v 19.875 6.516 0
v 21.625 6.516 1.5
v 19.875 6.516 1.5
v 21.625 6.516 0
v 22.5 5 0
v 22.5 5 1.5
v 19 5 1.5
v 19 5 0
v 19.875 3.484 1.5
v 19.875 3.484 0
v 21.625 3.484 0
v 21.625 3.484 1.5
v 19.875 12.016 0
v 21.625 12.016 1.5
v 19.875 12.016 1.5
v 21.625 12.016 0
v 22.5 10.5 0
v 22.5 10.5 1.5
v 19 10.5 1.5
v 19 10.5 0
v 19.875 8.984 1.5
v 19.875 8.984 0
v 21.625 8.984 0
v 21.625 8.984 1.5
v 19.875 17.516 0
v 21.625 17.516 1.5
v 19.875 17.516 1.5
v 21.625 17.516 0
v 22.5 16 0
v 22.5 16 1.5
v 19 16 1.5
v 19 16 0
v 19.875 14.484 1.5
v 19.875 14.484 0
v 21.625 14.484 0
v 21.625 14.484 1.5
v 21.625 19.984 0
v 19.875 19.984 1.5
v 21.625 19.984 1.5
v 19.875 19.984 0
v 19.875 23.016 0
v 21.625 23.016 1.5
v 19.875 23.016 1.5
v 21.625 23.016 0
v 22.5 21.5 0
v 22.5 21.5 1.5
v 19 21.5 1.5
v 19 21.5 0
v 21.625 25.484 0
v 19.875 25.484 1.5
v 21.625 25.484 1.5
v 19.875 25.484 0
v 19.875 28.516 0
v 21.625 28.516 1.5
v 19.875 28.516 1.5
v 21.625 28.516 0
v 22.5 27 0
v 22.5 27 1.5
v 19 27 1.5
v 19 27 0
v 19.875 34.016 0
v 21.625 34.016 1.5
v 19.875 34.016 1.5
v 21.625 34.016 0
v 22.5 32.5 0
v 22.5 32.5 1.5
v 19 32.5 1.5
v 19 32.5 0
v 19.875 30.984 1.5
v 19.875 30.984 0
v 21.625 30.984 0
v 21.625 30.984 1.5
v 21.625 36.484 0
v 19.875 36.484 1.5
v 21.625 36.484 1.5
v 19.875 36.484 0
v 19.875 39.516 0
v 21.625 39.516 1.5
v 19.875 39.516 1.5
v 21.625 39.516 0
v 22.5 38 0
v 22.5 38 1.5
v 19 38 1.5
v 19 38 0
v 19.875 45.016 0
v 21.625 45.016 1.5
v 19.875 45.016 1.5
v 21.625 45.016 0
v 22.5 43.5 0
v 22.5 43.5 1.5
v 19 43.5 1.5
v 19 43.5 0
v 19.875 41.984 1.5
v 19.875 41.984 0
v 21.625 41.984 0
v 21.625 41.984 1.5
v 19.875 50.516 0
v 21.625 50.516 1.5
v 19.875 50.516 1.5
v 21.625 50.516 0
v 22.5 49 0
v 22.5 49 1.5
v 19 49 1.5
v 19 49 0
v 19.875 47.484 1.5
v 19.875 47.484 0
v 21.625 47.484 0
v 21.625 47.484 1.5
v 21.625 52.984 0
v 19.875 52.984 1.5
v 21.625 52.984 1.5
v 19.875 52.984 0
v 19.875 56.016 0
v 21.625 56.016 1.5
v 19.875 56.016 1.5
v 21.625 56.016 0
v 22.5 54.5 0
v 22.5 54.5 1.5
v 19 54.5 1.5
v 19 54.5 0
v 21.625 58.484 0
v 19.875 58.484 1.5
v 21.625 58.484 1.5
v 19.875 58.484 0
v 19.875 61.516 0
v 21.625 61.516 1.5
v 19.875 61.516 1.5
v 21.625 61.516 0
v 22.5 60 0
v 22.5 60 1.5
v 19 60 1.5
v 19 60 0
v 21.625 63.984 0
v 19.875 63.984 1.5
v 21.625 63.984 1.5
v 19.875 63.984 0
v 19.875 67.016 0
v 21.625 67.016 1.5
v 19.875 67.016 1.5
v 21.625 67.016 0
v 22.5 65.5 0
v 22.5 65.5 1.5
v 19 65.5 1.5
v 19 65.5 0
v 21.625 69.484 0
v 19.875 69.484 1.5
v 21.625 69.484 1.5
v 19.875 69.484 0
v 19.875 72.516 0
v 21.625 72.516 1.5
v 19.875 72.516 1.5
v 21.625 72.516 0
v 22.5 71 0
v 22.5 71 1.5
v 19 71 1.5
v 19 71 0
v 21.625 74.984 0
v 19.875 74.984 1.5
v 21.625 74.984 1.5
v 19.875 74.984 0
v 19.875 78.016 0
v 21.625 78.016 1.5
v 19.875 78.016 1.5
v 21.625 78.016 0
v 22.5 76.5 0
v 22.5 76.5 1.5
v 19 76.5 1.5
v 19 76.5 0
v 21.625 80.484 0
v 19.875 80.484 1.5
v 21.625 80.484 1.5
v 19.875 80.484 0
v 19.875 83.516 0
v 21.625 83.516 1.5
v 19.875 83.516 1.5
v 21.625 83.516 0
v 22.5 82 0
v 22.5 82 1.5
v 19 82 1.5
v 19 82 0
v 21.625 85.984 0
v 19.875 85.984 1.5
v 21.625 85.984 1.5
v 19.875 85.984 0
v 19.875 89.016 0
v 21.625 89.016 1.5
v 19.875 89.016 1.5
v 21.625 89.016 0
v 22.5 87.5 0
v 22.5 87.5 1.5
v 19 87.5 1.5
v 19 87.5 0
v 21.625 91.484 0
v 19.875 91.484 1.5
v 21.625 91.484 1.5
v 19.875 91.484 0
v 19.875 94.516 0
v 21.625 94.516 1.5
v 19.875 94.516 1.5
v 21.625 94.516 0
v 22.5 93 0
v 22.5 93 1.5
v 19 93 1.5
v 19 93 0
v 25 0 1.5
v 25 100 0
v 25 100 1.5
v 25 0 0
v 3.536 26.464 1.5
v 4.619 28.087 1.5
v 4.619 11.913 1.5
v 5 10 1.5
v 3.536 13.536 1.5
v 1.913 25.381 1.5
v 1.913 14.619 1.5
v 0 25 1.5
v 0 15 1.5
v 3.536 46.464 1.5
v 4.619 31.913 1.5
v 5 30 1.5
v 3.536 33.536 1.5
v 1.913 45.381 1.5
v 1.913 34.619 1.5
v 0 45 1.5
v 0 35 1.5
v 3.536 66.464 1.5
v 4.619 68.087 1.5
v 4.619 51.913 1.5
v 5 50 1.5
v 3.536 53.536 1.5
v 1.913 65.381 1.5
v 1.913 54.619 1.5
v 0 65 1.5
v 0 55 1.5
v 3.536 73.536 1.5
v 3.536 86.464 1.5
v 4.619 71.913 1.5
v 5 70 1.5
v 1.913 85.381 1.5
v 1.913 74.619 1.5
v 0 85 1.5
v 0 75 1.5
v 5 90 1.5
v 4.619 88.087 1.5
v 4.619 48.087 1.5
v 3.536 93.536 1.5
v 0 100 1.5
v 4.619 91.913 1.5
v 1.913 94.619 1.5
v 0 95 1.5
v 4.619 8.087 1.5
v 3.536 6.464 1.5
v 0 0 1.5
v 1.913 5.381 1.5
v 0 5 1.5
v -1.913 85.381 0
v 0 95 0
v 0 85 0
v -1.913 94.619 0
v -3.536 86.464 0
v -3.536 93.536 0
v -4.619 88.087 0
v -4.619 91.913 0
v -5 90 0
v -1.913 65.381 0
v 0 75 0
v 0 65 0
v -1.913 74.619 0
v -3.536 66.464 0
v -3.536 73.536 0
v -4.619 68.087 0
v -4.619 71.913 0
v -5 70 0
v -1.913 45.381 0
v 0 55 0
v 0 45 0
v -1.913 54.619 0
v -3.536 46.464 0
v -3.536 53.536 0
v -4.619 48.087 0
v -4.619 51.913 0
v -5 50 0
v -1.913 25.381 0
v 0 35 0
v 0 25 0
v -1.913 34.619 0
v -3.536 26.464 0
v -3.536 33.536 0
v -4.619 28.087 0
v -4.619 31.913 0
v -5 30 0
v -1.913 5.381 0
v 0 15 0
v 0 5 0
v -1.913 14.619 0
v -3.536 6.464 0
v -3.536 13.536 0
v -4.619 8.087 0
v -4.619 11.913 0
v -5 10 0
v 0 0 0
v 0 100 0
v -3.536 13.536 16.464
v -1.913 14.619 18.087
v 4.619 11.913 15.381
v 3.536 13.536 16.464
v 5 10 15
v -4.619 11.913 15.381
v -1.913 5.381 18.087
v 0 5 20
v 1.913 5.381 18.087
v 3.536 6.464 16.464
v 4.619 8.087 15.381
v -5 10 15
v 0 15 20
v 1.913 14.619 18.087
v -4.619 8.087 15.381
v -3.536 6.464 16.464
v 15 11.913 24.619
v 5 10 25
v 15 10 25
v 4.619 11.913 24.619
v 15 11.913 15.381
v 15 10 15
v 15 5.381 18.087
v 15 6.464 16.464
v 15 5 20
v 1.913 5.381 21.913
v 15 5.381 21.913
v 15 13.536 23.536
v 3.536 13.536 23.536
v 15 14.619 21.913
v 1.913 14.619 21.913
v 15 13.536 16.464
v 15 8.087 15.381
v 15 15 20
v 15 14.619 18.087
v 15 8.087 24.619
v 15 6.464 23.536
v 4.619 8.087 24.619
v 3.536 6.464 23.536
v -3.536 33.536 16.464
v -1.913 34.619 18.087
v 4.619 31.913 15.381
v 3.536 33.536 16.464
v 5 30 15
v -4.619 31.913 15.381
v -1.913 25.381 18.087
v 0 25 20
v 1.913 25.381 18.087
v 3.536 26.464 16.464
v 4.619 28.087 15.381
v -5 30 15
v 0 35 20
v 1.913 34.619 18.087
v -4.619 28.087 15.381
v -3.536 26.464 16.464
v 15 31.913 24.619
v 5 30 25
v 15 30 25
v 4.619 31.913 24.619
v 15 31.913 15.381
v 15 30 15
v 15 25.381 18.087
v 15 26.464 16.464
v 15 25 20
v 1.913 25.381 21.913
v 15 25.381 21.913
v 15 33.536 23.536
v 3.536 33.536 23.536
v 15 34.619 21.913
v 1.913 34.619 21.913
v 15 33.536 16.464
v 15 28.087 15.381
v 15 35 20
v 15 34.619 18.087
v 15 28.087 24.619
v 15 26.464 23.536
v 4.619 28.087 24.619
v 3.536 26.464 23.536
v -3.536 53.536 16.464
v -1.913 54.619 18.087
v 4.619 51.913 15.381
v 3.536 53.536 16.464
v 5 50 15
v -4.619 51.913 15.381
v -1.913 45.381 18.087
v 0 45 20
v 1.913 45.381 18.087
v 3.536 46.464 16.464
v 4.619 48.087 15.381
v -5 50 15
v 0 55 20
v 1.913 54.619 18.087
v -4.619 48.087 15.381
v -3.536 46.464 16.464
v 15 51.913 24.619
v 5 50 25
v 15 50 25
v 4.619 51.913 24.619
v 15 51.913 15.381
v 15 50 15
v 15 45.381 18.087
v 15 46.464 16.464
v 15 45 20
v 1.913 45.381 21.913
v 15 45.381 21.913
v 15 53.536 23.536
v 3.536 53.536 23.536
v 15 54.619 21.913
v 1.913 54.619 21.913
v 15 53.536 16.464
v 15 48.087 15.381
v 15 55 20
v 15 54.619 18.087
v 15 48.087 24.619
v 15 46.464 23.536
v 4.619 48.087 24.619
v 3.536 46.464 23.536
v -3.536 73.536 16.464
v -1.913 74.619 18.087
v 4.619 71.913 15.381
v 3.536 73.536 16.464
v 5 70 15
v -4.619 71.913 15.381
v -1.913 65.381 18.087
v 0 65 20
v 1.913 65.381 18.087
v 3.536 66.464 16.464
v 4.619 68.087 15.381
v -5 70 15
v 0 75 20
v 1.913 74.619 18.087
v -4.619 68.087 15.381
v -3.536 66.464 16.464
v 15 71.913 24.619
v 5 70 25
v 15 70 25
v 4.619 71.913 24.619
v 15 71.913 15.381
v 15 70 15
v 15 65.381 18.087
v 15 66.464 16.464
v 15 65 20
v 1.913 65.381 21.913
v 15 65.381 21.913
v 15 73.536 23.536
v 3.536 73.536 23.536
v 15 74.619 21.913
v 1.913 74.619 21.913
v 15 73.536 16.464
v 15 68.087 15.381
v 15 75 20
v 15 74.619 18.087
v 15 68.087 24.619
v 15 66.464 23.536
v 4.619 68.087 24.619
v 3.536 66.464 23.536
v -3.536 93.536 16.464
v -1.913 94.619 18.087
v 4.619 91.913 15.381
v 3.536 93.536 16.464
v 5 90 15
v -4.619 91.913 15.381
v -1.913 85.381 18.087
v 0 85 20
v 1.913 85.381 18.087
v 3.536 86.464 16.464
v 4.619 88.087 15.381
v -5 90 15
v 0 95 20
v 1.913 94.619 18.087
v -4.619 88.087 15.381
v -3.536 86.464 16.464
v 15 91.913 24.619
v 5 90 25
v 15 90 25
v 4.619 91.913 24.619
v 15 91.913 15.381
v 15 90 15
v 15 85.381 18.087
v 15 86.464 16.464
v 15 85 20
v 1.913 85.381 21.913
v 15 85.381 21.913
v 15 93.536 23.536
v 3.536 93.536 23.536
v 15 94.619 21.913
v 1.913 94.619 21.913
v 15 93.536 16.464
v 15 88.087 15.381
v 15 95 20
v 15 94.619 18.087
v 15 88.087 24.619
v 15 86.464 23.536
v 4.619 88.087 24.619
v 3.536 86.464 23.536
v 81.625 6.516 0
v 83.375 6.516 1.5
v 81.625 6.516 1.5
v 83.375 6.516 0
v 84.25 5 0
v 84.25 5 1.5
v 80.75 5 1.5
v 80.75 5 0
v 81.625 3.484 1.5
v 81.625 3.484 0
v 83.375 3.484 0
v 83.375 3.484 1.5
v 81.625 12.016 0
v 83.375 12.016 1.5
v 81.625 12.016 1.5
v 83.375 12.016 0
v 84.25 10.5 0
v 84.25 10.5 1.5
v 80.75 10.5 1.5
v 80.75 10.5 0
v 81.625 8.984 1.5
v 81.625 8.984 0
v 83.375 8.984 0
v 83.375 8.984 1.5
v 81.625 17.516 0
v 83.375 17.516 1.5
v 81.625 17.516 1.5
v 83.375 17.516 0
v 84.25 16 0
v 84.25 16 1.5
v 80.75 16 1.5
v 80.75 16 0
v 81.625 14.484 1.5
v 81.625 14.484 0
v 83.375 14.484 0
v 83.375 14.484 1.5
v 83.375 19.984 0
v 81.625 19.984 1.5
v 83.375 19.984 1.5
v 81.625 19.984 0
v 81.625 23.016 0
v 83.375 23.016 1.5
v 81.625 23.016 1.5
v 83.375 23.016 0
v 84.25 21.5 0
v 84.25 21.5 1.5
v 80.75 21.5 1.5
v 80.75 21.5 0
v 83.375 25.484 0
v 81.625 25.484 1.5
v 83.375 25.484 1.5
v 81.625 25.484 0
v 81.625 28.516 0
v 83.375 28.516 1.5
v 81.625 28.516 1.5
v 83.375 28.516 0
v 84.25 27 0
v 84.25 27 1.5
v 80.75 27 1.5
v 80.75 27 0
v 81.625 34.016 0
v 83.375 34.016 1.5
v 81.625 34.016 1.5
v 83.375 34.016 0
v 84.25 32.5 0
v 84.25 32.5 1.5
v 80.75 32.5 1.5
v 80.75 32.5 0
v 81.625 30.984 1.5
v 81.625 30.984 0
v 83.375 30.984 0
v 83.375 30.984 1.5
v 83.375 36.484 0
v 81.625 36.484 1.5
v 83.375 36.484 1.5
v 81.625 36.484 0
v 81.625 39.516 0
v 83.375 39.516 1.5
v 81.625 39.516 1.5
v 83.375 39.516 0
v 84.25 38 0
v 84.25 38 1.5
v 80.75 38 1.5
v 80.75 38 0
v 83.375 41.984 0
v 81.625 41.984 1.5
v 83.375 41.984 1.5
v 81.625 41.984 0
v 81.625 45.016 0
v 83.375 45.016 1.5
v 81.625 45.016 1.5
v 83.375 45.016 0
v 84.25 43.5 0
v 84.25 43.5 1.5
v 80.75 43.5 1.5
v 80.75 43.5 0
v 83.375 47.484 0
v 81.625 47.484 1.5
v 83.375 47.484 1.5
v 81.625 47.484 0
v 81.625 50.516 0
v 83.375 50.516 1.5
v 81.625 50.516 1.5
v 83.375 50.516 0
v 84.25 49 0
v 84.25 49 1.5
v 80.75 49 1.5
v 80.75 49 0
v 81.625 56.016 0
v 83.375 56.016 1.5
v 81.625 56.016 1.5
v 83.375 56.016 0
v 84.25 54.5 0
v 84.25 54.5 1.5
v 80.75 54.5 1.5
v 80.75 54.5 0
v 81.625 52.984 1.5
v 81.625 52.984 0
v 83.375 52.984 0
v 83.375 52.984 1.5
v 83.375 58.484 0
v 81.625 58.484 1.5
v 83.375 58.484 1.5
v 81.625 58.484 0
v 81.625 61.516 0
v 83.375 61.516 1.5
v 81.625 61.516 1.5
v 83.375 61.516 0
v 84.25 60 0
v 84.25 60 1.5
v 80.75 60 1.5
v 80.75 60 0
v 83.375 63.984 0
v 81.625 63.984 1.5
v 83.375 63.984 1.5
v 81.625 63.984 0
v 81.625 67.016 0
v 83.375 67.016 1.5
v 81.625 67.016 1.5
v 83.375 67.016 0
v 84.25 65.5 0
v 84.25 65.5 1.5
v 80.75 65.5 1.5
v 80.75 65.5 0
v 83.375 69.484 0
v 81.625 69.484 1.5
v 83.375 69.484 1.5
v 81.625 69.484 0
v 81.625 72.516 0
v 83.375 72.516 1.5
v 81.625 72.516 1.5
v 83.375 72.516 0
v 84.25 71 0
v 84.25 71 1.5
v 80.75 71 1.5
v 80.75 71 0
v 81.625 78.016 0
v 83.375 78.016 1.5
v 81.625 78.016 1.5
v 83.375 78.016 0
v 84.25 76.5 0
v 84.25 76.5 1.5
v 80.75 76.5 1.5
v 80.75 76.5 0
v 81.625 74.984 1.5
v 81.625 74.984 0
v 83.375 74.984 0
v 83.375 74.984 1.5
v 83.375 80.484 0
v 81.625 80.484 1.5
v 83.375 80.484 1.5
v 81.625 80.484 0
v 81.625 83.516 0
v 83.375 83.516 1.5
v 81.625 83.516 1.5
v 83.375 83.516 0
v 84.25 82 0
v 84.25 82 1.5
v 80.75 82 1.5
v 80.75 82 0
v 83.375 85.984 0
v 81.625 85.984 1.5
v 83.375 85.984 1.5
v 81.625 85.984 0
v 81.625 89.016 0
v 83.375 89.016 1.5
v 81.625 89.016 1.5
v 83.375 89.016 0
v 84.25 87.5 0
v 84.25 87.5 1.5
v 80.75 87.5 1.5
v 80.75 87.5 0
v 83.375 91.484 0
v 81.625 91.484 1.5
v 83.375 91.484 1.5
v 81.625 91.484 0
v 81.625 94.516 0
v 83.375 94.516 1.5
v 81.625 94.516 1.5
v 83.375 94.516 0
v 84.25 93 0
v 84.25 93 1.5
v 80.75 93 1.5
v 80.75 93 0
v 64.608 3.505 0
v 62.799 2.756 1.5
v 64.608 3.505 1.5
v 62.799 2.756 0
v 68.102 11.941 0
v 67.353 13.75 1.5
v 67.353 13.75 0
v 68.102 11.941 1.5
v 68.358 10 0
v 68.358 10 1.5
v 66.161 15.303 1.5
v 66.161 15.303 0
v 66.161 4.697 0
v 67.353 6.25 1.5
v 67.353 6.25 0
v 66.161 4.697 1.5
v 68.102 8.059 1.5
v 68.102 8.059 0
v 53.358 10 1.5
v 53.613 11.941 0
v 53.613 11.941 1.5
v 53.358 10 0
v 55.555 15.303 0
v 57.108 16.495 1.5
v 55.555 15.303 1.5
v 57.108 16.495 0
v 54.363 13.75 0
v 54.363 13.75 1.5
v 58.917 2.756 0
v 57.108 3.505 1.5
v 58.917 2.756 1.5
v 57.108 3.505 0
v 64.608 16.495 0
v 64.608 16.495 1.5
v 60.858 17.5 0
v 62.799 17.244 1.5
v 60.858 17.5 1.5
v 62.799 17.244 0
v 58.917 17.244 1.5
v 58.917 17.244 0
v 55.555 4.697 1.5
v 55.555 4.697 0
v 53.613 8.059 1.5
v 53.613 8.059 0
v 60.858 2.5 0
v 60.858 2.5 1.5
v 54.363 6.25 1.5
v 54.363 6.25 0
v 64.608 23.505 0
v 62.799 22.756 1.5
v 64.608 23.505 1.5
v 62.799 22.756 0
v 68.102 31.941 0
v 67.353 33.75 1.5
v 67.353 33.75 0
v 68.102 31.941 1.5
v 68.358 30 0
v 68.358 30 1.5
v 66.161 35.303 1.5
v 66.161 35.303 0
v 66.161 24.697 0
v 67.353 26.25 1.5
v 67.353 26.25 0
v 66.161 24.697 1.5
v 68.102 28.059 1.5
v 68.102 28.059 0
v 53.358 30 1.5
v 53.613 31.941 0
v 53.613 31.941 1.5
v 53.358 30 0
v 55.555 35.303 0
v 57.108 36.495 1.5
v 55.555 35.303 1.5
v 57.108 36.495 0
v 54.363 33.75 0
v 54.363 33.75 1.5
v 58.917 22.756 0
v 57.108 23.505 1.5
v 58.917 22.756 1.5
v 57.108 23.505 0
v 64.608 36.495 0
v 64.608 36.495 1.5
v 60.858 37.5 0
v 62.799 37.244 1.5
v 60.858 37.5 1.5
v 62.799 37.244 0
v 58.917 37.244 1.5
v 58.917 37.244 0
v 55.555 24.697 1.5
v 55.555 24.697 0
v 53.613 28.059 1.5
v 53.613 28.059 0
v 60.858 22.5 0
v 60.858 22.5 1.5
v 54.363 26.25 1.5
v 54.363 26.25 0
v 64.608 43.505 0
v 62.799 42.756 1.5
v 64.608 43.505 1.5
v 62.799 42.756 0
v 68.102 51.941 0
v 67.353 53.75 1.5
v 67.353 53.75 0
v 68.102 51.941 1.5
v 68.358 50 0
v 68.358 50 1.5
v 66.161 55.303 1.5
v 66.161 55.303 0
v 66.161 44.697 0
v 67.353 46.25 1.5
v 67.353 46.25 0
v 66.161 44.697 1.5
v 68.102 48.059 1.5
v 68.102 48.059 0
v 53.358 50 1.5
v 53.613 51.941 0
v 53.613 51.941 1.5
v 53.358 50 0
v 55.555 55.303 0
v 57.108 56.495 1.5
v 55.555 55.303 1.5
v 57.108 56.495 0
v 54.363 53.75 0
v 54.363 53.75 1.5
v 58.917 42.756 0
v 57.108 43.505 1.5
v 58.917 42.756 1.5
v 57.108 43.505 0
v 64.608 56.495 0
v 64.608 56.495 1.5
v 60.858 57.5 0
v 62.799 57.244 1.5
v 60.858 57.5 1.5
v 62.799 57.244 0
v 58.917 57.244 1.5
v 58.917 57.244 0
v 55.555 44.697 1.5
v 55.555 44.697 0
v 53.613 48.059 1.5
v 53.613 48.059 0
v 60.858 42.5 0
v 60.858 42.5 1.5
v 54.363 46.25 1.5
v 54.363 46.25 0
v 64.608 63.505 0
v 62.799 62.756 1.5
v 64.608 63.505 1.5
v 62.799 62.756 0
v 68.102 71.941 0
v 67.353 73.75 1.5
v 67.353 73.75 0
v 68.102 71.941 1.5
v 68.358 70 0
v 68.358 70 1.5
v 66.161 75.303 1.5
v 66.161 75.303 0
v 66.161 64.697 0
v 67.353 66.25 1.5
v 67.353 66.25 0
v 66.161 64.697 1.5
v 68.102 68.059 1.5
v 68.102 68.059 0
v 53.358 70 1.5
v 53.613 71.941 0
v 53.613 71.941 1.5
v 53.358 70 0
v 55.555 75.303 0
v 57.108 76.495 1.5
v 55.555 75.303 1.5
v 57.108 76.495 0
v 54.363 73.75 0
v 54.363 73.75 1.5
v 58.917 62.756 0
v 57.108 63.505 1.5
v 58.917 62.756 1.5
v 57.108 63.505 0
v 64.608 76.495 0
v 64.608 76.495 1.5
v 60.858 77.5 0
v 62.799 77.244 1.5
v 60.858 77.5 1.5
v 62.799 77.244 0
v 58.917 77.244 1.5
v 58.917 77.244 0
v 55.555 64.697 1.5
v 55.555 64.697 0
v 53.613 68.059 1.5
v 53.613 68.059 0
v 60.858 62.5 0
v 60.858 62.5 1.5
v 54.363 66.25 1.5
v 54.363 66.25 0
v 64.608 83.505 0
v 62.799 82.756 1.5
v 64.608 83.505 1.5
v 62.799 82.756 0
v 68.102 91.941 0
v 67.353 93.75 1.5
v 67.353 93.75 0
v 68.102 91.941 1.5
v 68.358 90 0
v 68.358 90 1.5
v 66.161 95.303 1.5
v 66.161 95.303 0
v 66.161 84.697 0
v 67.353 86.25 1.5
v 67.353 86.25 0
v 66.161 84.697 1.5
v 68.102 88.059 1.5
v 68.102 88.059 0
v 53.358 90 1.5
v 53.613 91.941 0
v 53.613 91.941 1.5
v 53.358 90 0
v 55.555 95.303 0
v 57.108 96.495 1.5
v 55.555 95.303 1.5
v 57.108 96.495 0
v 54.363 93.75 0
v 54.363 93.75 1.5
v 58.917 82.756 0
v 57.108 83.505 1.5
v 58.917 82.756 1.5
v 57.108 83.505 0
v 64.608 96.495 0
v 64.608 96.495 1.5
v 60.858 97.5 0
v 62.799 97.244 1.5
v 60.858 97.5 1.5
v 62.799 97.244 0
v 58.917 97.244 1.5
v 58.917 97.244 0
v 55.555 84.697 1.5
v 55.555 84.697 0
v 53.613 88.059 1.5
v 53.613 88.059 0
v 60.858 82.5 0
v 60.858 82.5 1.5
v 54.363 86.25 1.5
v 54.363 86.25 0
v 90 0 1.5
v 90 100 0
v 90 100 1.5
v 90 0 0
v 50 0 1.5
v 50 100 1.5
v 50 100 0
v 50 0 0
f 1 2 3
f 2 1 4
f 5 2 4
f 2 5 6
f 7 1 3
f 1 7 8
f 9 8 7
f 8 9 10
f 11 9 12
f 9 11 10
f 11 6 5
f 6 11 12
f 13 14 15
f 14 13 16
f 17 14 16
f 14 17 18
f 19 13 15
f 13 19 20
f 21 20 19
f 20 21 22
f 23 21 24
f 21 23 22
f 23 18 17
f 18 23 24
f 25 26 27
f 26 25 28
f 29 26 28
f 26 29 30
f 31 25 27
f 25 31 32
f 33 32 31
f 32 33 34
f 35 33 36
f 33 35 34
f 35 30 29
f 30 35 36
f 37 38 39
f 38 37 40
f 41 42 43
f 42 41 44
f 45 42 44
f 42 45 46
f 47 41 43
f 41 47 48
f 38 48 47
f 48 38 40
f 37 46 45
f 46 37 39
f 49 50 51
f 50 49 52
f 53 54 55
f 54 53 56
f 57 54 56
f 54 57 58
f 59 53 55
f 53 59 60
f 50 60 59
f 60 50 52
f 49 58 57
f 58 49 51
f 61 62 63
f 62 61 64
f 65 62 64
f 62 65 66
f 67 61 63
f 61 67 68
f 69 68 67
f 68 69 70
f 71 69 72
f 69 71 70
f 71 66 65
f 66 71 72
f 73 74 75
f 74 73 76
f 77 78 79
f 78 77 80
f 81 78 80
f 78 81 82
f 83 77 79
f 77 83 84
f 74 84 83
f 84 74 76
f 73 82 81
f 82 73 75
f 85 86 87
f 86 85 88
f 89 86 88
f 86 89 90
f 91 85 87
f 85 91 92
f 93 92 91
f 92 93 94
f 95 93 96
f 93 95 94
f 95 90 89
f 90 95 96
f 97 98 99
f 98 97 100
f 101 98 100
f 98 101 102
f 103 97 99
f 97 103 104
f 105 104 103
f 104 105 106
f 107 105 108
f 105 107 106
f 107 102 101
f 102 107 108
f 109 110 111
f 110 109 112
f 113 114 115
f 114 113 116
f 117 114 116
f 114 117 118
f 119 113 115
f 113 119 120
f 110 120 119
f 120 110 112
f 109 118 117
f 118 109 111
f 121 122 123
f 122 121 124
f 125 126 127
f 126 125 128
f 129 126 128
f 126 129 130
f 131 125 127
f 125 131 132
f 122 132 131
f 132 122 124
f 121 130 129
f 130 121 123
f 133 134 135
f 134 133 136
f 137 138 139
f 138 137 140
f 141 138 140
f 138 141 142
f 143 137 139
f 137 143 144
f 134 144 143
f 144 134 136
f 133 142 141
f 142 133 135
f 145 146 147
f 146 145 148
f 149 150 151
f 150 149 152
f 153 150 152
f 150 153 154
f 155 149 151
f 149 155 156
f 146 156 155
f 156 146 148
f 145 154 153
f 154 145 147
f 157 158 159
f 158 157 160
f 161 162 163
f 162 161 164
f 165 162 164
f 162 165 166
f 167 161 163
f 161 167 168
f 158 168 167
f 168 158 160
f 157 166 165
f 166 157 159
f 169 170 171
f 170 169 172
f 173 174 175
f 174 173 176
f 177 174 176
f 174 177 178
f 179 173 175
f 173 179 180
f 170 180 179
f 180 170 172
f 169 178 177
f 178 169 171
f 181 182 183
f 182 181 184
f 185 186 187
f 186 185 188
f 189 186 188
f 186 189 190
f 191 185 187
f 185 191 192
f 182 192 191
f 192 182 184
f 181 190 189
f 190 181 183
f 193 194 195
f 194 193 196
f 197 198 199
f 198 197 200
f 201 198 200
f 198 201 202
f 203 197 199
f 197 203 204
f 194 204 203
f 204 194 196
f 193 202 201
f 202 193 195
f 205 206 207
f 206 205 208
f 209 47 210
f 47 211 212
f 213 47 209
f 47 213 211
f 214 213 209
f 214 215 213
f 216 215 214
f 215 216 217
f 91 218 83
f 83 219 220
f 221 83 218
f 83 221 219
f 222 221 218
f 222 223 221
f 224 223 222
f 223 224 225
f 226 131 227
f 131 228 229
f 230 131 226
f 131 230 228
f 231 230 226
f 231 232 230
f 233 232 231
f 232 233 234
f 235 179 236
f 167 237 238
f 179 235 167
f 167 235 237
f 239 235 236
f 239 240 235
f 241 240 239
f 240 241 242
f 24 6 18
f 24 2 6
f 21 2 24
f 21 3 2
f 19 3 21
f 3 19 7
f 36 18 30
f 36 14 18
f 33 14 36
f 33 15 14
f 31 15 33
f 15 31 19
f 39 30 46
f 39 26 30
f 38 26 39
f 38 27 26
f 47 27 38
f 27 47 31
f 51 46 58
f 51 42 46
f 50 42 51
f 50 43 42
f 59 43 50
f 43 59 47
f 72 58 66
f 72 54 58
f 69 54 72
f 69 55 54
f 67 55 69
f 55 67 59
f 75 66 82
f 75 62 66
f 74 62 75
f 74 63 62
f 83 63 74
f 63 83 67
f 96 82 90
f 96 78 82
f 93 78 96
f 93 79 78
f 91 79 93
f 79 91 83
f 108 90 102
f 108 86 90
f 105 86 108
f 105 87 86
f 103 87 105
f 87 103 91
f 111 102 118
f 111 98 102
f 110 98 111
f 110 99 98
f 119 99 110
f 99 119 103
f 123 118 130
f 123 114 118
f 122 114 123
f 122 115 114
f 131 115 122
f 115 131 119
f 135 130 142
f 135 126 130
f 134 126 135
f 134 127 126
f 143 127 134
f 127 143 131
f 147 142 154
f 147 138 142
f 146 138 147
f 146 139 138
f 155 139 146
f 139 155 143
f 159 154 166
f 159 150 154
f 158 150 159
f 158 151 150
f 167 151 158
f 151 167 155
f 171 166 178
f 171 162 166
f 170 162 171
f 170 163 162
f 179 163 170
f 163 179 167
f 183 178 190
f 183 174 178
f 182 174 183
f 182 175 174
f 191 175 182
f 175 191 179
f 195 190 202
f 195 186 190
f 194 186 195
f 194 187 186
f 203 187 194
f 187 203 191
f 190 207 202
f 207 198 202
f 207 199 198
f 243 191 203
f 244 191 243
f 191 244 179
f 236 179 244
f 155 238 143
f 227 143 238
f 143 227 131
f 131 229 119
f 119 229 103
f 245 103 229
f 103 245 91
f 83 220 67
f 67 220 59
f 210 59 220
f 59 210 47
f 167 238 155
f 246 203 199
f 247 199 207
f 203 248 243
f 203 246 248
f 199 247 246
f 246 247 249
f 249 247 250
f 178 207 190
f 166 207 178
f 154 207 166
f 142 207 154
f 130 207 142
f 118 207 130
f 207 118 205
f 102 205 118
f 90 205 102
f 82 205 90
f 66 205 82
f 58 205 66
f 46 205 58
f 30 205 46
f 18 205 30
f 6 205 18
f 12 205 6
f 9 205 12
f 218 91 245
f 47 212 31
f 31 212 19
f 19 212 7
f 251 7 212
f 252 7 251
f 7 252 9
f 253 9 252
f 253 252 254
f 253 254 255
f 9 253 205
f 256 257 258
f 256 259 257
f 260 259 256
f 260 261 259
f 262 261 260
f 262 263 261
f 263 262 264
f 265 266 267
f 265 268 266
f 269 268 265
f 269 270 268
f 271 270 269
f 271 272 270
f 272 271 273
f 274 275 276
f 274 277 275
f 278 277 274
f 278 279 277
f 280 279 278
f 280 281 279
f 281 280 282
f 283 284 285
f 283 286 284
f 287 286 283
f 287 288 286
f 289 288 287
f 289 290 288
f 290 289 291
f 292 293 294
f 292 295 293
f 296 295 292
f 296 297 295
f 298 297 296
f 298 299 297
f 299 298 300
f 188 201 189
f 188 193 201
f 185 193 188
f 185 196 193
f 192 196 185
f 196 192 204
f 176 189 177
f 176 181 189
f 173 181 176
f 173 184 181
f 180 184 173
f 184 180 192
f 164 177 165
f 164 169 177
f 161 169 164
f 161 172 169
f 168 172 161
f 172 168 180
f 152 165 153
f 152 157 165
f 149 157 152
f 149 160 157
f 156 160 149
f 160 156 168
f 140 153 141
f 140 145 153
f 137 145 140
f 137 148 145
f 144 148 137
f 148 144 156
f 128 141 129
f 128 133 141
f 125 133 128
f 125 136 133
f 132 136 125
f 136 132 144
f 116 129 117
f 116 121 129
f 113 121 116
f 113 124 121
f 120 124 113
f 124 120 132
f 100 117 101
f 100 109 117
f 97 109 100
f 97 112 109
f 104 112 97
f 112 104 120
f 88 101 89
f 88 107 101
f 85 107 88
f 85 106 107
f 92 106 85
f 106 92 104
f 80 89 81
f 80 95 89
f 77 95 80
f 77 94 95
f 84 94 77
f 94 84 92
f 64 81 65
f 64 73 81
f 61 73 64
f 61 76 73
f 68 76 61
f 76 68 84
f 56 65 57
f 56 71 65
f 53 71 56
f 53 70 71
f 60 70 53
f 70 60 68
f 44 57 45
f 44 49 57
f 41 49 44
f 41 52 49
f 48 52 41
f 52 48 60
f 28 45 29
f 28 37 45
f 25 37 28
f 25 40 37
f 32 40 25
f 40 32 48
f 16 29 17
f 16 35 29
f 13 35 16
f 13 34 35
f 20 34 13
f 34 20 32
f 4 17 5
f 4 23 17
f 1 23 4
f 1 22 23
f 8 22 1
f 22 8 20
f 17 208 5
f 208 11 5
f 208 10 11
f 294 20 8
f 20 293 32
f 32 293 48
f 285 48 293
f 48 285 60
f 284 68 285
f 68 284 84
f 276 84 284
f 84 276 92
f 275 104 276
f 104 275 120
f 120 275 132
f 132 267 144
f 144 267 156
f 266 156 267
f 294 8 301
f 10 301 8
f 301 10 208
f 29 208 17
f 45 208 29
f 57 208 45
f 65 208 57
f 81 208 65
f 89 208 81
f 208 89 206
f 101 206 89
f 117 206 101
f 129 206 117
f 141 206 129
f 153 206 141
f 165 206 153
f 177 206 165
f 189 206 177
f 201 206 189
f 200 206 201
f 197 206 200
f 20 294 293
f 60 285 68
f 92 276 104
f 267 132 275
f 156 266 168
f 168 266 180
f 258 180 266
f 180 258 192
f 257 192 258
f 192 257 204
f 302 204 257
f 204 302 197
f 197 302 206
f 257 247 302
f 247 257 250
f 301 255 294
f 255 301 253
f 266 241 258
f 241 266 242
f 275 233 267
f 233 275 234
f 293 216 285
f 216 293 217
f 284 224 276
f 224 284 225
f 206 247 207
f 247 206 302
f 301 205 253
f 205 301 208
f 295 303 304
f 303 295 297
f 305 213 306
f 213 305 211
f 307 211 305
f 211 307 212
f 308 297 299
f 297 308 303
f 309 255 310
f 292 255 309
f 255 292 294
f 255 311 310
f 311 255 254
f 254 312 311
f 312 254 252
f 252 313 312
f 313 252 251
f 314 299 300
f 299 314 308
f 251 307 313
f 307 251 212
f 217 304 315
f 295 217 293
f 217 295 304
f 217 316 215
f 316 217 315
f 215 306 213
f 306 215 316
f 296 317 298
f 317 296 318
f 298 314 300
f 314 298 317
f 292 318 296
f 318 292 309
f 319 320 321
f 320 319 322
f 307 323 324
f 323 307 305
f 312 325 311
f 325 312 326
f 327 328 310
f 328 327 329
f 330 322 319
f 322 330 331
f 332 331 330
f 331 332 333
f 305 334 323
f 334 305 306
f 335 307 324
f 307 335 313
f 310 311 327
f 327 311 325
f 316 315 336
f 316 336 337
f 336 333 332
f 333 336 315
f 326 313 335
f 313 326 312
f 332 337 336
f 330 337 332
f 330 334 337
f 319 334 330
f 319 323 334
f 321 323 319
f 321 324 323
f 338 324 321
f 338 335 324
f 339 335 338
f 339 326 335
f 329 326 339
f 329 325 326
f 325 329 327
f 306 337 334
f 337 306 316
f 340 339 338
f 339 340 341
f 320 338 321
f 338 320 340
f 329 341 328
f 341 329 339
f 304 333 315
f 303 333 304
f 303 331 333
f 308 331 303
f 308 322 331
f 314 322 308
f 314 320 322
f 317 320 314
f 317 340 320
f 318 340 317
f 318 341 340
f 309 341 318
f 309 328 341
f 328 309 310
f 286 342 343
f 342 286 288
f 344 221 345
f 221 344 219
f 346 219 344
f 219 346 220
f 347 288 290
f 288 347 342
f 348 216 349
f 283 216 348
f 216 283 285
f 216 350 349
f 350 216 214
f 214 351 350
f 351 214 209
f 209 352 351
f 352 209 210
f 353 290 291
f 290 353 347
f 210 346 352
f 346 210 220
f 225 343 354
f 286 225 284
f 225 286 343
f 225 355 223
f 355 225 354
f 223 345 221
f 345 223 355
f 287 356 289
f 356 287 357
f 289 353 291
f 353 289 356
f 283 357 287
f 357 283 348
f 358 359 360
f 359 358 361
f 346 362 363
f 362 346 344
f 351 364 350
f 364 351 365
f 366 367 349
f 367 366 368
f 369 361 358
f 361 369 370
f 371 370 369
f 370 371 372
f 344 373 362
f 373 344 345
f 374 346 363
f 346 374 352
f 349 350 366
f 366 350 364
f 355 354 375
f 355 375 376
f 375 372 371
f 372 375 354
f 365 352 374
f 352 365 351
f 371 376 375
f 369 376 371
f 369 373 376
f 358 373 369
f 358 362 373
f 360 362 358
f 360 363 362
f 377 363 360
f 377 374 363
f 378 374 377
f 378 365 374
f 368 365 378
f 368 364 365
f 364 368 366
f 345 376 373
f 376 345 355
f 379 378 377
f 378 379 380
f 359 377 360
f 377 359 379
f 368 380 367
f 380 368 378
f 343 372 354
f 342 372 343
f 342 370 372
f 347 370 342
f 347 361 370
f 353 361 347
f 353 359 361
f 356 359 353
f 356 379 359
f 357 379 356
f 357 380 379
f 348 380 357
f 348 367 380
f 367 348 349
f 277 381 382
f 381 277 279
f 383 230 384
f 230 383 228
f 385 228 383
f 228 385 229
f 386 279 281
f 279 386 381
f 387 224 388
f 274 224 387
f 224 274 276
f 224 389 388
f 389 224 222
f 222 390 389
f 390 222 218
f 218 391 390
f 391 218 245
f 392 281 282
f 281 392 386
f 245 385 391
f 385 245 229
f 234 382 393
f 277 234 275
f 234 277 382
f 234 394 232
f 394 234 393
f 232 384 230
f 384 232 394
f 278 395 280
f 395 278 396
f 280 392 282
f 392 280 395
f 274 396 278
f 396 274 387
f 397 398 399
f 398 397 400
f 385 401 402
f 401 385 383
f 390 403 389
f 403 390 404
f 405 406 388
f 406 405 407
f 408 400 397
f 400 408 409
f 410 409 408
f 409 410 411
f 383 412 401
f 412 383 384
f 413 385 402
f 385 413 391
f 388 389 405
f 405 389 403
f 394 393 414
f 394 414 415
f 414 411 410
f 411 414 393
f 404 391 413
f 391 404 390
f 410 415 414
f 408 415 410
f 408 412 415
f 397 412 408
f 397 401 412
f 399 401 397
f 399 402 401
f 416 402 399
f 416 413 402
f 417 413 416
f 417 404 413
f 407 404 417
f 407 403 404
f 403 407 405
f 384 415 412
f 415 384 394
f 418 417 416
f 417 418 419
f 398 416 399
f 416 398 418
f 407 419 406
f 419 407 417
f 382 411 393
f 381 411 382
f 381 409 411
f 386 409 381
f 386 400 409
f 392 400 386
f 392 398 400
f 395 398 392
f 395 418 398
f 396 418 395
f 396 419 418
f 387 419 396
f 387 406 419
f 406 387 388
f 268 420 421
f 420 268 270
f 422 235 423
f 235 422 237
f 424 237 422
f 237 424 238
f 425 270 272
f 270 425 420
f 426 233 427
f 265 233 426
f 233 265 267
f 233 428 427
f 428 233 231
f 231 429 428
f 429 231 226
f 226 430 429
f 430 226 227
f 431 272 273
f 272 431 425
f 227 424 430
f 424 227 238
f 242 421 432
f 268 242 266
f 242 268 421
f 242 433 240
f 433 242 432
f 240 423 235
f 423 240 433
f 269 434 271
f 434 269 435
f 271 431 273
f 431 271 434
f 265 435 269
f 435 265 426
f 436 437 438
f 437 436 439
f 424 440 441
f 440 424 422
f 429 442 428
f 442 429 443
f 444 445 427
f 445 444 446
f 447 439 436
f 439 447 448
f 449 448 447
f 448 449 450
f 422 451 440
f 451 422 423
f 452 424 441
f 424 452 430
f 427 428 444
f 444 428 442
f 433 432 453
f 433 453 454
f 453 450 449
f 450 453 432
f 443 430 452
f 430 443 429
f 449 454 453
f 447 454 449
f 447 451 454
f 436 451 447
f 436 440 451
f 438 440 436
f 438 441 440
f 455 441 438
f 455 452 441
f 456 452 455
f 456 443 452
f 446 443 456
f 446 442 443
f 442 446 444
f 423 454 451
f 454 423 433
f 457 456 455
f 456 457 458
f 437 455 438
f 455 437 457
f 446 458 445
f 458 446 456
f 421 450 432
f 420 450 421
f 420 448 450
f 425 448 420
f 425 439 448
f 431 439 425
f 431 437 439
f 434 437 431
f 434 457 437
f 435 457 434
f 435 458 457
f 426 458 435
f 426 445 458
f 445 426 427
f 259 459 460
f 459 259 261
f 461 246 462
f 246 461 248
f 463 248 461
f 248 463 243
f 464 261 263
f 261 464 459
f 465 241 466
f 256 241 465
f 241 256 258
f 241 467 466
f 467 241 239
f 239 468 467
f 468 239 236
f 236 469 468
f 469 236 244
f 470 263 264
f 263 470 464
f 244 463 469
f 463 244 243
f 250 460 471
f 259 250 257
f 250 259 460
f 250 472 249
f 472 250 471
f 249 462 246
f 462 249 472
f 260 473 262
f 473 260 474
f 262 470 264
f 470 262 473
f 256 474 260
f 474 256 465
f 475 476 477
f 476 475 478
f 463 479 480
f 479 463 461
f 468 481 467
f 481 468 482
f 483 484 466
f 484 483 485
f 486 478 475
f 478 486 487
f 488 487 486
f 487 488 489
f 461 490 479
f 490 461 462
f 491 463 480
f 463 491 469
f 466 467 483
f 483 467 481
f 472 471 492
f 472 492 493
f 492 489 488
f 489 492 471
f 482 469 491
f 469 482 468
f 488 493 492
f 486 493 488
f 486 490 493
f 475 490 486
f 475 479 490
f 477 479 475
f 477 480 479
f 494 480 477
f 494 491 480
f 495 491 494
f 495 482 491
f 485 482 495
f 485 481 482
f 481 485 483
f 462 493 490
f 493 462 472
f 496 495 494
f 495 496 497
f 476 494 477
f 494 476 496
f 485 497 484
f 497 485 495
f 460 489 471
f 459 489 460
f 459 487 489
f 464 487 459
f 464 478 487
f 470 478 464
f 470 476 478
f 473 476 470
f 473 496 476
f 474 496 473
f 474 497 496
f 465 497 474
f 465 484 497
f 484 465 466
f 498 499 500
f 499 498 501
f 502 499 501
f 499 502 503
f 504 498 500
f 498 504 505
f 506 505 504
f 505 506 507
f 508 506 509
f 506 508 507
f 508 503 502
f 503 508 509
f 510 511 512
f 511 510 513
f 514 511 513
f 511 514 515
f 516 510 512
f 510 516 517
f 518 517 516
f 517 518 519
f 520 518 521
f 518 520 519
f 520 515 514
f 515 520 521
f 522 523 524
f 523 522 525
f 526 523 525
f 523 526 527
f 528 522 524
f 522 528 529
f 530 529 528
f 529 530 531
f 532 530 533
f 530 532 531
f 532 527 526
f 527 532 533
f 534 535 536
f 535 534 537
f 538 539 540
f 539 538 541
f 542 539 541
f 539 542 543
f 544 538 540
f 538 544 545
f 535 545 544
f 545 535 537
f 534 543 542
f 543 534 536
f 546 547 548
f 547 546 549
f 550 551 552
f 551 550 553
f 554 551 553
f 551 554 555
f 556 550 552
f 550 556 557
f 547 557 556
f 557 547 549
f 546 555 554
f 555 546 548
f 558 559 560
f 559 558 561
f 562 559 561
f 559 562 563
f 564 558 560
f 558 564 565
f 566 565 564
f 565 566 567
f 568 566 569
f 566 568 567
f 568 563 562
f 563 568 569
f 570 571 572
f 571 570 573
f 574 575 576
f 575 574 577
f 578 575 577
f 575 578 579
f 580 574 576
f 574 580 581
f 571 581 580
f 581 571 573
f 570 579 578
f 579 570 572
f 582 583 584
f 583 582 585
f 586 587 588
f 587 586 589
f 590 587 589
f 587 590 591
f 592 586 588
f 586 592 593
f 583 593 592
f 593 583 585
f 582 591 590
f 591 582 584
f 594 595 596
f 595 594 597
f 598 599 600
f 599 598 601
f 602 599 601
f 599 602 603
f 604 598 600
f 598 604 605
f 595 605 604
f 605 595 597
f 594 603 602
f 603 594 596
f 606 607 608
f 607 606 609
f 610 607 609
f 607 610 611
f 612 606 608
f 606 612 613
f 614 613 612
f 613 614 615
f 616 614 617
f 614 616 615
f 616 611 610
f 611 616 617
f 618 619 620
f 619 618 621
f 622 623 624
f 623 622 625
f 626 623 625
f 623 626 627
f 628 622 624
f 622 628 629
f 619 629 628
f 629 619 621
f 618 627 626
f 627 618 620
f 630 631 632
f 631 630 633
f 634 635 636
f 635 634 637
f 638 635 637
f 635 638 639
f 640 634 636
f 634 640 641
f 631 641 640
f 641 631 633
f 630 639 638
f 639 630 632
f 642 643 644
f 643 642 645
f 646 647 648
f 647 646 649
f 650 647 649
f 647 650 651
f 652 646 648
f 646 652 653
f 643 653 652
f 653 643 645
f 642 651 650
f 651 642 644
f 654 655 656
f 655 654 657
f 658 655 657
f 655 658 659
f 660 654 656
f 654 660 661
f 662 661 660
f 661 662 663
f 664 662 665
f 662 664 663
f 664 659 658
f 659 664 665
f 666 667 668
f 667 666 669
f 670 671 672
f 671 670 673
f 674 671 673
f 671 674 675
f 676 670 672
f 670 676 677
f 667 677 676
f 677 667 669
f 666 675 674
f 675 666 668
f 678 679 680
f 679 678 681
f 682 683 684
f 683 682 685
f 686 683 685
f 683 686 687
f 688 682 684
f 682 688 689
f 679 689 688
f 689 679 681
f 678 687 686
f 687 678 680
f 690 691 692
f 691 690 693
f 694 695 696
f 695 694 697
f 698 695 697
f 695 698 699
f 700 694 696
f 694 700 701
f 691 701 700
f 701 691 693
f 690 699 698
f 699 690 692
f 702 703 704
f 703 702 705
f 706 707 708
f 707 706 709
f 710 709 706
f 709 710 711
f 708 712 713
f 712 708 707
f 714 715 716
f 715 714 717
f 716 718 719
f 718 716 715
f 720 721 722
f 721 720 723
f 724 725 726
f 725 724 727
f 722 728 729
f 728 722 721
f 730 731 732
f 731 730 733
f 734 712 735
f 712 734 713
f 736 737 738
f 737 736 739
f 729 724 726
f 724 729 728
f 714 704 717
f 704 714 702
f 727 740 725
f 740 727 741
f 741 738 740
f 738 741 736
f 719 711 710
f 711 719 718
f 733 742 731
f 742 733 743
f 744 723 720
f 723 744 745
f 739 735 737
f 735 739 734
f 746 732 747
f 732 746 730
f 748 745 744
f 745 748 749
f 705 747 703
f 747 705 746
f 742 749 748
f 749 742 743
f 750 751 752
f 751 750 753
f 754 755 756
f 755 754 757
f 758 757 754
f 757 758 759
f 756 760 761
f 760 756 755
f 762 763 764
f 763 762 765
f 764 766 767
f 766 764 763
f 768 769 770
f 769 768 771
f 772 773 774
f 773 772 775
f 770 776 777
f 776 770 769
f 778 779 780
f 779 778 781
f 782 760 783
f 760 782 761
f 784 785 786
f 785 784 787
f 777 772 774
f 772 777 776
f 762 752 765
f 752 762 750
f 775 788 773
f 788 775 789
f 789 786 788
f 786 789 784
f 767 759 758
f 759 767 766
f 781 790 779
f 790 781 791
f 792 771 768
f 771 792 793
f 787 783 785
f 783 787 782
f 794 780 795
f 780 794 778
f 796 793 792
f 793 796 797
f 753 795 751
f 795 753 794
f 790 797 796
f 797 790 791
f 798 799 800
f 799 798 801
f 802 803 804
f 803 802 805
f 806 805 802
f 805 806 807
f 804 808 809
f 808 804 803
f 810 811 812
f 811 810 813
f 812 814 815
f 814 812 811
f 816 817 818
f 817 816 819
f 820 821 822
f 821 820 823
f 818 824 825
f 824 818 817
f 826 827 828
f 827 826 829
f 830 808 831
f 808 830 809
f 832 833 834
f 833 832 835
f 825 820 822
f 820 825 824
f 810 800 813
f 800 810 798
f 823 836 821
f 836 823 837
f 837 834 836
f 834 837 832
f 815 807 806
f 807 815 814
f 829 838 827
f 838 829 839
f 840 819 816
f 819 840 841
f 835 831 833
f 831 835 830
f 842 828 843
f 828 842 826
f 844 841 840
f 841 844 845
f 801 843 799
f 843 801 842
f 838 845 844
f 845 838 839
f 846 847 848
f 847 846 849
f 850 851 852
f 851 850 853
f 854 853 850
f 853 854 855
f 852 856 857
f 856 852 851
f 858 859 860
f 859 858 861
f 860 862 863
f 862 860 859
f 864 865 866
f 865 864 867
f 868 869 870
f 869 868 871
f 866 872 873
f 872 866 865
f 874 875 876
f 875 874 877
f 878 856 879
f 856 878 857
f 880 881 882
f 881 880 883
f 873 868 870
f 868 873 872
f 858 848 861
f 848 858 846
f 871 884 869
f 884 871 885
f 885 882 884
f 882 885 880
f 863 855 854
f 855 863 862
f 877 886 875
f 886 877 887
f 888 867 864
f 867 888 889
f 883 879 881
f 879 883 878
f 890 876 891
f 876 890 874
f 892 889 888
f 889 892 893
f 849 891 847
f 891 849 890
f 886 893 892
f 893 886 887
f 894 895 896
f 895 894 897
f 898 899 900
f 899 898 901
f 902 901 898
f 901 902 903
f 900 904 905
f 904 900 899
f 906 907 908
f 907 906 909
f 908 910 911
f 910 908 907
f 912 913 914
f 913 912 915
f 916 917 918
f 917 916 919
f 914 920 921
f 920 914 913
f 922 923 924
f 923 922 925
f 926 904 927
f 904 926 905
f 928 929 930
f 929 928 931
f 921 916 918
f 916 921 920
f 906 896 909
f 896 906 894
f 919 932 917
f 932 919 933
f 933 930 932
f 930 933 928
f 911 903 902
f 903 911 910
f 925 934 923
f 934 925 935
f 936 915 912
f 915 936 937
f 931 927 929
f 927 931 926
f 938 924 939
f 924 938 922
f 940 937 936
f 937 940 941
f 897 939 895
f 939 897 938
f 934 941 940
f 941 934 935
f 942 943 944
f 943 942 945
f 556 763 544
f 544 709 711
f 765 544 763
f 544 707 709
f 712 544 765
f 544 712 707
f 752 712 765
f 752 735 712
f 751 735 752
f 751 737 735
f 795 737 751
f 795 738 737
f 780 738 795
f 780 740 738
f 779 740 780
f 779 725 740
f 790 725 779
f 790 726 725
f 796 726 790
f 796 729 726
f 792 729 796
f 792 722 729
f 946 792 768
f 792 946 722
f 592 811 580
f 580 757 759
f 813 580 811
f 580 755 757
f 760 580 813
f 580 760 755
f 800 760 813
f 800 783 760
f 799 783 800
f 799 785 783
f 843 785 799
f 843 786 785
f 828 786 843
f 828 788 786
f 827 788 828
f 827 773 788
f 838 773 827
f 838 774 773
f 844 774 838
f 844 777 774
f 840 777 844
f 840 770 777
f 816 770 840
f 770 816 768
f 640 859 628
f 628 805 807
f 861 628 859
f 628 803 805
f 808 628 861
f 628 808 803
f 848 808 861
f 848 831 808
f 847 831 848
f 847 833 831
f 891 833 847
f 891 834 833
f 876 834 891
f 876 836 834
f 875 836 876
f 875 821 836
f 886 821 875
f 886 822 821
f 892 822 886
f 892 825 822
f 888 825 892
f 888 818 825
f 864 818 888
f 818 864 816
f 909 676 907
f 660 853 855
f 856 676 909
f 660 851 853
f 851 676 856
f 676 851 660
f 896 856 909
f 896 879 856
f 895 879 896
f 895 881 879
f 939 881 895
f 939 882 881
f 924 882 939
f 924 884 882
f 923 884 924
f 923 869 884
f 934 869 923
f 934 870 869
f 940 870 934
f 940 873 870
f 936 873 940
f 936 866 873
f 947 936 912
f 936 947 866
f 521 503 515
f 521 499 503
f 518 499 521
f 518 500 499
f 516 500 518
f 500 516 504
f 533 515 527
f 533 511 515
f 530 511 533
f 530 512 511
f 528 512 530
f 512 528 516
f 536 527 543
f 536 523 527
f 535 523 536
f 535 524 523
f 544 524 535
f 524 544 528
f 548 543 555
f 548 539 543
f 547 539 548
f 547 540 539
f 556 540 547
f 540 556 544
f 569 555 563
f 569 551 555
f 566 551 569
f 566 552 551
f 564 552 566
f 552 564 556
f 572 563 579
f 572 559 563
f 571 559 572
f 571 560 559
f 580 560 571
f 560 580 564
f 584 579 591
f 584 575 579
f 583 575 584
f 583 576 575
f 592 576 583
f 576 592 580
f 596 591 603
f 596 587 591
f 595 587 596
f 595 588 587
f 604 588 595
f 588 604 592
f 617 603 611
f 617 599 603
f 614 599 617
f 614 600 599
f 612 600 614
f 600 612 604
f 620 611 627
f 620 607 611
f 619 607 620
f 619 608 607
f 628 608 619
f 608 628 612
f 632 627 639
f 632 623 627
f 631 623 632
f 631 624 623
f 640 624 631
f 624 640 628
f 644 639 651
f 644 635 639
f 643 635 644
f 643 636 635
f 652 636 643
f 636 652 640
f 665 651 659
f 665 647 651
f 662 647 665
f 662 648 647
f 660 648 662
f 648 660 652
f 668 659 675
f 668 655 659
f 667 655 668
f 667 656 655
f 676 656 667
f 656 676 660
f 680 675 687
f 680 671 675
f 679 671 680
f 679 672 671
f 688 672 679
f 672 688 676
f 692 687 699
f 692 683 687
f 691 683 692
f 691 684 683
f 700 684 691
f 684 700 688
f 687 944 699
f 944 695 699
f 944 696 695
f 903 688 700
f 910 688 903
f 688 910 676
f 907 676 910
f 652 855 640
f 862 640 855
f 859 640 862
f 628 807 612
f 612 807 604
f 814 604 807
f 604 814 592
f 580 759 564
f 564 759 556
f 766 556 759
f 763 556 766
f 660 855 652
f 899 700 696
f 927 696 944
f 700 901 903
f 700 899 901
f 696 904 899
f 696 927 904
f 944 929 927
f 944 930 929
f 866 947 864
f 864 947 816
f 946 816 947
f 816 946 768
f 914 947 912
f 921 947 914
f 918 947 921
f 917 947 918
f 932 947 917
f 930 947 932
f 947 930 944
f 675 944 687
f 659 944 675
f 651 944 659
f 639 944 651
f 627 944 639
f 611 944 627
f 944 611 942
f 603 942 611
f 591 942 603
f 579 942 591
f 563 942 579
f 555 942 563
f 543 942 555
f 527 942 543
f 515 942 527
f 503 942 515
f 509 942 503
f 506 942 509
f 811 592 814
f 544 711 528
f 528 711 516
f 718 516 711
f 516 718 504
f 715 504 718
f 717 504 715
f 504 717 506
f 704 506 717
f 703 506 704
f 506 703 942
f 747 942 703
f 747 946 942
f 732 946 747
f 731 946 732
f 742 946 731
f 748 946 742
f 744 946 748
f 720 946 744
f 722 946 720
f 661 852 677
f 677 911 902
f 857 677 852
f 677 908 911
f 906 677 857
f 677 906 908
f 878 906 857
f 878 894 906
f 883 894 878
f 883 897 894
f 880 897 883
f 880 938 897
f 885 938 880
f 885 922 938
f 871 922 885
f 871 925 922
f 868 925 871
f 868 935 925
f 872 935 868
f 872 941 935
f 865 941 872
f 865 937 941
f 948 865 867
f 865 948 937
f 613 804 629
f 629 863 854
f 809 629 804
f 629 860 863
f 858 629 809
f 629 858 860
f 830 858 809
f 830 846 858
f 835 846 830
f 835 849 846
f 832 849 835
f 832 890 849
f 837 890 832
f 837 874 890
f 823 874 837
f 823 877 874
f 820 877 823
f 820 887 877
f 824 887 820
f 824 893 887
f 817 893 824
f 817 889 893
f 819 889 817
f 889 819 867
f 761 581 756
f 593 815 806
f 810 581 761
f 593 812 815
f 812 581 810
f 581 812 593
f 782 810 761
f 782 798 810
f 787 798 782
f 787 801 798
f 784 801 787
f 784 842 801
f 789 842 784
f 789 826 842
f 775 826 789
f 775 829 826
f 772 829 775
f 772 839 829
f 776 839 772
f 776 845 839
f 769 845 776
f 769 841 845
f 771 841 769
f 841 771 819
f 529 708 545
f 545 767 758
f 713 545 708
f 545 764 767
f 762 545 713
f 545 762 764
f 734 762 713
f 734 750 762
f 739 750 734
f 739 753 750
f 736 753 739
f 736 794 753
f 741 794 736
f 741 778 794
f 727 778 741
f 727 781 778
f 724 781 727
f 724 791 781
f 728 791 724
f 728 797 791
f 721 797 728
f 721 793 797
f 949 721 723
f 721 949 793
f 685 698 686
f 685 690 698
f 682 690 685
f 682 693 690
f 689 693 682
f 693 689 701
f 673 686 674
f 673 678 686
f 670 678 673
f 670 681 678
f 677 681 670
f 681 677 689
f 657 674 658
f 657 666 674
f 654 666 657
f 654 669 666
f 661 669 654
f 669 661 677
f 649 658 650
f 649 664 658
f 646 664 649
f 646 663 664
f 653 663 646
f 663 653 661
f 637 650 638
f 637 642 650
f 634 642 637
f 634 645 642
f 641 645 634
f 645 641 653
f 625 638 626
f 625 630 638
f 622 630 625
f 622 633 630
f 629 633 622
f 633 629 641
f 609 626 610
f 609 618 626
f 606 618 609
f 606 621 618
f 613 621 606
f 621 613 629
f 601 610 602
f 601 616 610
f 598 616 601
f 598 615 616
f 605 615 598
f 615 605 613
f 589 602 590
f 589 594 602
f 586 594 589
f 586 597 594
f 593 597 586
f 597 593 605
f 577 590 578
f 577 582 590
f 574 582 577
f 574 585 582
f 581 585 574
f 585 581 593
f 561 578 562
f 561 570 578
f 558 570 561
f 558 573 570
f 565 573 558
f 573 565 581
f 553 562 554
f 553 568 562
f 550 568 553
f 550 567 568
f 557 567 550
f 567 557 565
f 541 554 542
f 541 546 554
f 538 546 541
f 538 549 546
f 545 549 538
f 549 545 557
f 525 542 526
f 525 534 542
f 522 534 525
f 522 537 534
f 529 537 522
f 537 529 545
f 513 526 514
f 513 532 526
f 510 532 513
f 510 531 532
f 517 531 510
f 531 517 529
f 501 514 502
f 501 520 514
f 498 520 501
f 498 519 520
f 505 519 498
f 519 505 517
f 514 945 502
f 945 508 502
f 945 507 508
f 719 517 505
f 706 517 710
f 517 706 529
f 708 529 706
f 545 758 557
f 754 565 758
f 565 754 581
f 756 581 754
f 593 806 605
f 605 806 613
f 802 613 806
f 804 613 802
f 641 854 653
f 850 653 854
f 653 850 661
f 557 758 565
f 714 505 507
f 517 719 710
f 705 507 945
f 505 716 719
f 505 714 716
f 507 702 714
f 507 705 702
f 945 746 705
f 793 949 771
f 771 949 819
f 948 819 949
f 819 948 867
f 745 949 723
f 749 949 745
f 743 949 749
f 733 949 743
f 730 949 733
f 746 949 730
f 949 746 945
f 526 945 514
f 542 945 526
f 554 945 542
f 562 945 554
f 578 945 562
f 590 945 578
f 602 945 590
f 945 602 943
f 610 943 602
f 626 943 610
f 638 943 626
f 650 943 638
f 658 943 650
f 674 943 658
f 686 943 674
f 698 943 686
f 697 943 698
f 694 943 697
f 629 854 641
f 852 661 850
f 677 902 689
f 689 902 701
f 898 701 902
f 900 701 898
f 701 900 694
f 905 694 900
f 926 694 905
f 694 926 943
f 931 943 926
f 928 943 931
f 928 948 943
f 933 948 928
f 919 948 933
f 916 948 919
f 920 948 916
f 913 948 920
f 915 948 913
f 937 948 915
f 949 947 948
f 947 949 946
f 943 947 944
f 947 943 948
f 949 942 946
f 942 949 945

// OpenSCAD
$num_hooks = 5;
$hook_thick = 10;
$hook_tall = 20;
$hook_size = 15;
$working_width = 90;
$base_wide = 25;
$base_thick = 1.5;
$needle_width = 3.5;
$needle_gap = 2;
$sewing_hole_region = $base_wide-$hook_thick;
$sewing_hole_x_adjustment = $sewing_hole_region + ($sewing_hole_region-$needle_width)/2;

$peg_hole_size = sqrt(2*$hook_thick*$hook_thick); //the maximum width of a 45 degree cross section of the peg. 

$space_without_hooks = $working_width - ($num_hooks*$hook_thick);

$space_between_hooks = $space_without_hooks / ($num_hooks - 1);

module make_sewing_hole(){
    translate([0,0,-0.05])
    cylinder(h=$base_thick + 1.1, r=$needle_width/2);
};

module make_holepeg (){
    cylinder(r=$hook_thick/2*1.5, h=$hook_size);
};

module make_hook(size_off, size_hook, thick, b_thick) {
    difference(){
        union(){
            cylinder(r=thick/2, h=size_off);
            translate([0,0,size_off])
            sphere(r=thick/2);
            translate([0,0,size_off])
            rotate([0,90,0])
            cylinder(r=thick/2, h=size_hook);
        };
        translate([0,-thick/2,size_off])
        rotate([0,315,0])
        translate([-thick,0,0])
        cube(thick*2);
    }
};

union(){
    difference(){
        cube([$base_wide, $working_width + $hook_thick, $base_thick]);
        for (i = [0:$working_width/($needle_width+$needle_gap)]){
            translate([$sewing_hole_x_adjustment, $hook_thick/2 + i*$needle_width + i*$needle_gap])
            make_sewing_hole();
        };
    }

    for (i = [0:$num_hooks-1]){
        translate([0, i*$space_between_hooks + i*$hook_thick + $hook_thick , 0])
        make_hook($hook_tall, $hook_size, $hook_thick, $base_thick);
    };
};

    translate([$base_wide*2, 0, 0])
difference(){
    cube([$base_wide + $sewing_hole_region, $working_width + $hook_thick, $base_thick]);
        for (i = [0:$working_width/($needle_width+$needle_gap)]){
            translate([$base_wide + $sewing_hole_region/2, $hook_thick/2 + i*$needle_width + i*$needle_gap])
            make_sewing_hole();
        };
 
    for (i = [0:$num_hooks-1]){
        
    translate([$base_wide - $peg_hole_size, i*$space_between_hooks + i*$hook_thick + $hook_thick, -0.05])
    make_holepeg();
};

    
};
